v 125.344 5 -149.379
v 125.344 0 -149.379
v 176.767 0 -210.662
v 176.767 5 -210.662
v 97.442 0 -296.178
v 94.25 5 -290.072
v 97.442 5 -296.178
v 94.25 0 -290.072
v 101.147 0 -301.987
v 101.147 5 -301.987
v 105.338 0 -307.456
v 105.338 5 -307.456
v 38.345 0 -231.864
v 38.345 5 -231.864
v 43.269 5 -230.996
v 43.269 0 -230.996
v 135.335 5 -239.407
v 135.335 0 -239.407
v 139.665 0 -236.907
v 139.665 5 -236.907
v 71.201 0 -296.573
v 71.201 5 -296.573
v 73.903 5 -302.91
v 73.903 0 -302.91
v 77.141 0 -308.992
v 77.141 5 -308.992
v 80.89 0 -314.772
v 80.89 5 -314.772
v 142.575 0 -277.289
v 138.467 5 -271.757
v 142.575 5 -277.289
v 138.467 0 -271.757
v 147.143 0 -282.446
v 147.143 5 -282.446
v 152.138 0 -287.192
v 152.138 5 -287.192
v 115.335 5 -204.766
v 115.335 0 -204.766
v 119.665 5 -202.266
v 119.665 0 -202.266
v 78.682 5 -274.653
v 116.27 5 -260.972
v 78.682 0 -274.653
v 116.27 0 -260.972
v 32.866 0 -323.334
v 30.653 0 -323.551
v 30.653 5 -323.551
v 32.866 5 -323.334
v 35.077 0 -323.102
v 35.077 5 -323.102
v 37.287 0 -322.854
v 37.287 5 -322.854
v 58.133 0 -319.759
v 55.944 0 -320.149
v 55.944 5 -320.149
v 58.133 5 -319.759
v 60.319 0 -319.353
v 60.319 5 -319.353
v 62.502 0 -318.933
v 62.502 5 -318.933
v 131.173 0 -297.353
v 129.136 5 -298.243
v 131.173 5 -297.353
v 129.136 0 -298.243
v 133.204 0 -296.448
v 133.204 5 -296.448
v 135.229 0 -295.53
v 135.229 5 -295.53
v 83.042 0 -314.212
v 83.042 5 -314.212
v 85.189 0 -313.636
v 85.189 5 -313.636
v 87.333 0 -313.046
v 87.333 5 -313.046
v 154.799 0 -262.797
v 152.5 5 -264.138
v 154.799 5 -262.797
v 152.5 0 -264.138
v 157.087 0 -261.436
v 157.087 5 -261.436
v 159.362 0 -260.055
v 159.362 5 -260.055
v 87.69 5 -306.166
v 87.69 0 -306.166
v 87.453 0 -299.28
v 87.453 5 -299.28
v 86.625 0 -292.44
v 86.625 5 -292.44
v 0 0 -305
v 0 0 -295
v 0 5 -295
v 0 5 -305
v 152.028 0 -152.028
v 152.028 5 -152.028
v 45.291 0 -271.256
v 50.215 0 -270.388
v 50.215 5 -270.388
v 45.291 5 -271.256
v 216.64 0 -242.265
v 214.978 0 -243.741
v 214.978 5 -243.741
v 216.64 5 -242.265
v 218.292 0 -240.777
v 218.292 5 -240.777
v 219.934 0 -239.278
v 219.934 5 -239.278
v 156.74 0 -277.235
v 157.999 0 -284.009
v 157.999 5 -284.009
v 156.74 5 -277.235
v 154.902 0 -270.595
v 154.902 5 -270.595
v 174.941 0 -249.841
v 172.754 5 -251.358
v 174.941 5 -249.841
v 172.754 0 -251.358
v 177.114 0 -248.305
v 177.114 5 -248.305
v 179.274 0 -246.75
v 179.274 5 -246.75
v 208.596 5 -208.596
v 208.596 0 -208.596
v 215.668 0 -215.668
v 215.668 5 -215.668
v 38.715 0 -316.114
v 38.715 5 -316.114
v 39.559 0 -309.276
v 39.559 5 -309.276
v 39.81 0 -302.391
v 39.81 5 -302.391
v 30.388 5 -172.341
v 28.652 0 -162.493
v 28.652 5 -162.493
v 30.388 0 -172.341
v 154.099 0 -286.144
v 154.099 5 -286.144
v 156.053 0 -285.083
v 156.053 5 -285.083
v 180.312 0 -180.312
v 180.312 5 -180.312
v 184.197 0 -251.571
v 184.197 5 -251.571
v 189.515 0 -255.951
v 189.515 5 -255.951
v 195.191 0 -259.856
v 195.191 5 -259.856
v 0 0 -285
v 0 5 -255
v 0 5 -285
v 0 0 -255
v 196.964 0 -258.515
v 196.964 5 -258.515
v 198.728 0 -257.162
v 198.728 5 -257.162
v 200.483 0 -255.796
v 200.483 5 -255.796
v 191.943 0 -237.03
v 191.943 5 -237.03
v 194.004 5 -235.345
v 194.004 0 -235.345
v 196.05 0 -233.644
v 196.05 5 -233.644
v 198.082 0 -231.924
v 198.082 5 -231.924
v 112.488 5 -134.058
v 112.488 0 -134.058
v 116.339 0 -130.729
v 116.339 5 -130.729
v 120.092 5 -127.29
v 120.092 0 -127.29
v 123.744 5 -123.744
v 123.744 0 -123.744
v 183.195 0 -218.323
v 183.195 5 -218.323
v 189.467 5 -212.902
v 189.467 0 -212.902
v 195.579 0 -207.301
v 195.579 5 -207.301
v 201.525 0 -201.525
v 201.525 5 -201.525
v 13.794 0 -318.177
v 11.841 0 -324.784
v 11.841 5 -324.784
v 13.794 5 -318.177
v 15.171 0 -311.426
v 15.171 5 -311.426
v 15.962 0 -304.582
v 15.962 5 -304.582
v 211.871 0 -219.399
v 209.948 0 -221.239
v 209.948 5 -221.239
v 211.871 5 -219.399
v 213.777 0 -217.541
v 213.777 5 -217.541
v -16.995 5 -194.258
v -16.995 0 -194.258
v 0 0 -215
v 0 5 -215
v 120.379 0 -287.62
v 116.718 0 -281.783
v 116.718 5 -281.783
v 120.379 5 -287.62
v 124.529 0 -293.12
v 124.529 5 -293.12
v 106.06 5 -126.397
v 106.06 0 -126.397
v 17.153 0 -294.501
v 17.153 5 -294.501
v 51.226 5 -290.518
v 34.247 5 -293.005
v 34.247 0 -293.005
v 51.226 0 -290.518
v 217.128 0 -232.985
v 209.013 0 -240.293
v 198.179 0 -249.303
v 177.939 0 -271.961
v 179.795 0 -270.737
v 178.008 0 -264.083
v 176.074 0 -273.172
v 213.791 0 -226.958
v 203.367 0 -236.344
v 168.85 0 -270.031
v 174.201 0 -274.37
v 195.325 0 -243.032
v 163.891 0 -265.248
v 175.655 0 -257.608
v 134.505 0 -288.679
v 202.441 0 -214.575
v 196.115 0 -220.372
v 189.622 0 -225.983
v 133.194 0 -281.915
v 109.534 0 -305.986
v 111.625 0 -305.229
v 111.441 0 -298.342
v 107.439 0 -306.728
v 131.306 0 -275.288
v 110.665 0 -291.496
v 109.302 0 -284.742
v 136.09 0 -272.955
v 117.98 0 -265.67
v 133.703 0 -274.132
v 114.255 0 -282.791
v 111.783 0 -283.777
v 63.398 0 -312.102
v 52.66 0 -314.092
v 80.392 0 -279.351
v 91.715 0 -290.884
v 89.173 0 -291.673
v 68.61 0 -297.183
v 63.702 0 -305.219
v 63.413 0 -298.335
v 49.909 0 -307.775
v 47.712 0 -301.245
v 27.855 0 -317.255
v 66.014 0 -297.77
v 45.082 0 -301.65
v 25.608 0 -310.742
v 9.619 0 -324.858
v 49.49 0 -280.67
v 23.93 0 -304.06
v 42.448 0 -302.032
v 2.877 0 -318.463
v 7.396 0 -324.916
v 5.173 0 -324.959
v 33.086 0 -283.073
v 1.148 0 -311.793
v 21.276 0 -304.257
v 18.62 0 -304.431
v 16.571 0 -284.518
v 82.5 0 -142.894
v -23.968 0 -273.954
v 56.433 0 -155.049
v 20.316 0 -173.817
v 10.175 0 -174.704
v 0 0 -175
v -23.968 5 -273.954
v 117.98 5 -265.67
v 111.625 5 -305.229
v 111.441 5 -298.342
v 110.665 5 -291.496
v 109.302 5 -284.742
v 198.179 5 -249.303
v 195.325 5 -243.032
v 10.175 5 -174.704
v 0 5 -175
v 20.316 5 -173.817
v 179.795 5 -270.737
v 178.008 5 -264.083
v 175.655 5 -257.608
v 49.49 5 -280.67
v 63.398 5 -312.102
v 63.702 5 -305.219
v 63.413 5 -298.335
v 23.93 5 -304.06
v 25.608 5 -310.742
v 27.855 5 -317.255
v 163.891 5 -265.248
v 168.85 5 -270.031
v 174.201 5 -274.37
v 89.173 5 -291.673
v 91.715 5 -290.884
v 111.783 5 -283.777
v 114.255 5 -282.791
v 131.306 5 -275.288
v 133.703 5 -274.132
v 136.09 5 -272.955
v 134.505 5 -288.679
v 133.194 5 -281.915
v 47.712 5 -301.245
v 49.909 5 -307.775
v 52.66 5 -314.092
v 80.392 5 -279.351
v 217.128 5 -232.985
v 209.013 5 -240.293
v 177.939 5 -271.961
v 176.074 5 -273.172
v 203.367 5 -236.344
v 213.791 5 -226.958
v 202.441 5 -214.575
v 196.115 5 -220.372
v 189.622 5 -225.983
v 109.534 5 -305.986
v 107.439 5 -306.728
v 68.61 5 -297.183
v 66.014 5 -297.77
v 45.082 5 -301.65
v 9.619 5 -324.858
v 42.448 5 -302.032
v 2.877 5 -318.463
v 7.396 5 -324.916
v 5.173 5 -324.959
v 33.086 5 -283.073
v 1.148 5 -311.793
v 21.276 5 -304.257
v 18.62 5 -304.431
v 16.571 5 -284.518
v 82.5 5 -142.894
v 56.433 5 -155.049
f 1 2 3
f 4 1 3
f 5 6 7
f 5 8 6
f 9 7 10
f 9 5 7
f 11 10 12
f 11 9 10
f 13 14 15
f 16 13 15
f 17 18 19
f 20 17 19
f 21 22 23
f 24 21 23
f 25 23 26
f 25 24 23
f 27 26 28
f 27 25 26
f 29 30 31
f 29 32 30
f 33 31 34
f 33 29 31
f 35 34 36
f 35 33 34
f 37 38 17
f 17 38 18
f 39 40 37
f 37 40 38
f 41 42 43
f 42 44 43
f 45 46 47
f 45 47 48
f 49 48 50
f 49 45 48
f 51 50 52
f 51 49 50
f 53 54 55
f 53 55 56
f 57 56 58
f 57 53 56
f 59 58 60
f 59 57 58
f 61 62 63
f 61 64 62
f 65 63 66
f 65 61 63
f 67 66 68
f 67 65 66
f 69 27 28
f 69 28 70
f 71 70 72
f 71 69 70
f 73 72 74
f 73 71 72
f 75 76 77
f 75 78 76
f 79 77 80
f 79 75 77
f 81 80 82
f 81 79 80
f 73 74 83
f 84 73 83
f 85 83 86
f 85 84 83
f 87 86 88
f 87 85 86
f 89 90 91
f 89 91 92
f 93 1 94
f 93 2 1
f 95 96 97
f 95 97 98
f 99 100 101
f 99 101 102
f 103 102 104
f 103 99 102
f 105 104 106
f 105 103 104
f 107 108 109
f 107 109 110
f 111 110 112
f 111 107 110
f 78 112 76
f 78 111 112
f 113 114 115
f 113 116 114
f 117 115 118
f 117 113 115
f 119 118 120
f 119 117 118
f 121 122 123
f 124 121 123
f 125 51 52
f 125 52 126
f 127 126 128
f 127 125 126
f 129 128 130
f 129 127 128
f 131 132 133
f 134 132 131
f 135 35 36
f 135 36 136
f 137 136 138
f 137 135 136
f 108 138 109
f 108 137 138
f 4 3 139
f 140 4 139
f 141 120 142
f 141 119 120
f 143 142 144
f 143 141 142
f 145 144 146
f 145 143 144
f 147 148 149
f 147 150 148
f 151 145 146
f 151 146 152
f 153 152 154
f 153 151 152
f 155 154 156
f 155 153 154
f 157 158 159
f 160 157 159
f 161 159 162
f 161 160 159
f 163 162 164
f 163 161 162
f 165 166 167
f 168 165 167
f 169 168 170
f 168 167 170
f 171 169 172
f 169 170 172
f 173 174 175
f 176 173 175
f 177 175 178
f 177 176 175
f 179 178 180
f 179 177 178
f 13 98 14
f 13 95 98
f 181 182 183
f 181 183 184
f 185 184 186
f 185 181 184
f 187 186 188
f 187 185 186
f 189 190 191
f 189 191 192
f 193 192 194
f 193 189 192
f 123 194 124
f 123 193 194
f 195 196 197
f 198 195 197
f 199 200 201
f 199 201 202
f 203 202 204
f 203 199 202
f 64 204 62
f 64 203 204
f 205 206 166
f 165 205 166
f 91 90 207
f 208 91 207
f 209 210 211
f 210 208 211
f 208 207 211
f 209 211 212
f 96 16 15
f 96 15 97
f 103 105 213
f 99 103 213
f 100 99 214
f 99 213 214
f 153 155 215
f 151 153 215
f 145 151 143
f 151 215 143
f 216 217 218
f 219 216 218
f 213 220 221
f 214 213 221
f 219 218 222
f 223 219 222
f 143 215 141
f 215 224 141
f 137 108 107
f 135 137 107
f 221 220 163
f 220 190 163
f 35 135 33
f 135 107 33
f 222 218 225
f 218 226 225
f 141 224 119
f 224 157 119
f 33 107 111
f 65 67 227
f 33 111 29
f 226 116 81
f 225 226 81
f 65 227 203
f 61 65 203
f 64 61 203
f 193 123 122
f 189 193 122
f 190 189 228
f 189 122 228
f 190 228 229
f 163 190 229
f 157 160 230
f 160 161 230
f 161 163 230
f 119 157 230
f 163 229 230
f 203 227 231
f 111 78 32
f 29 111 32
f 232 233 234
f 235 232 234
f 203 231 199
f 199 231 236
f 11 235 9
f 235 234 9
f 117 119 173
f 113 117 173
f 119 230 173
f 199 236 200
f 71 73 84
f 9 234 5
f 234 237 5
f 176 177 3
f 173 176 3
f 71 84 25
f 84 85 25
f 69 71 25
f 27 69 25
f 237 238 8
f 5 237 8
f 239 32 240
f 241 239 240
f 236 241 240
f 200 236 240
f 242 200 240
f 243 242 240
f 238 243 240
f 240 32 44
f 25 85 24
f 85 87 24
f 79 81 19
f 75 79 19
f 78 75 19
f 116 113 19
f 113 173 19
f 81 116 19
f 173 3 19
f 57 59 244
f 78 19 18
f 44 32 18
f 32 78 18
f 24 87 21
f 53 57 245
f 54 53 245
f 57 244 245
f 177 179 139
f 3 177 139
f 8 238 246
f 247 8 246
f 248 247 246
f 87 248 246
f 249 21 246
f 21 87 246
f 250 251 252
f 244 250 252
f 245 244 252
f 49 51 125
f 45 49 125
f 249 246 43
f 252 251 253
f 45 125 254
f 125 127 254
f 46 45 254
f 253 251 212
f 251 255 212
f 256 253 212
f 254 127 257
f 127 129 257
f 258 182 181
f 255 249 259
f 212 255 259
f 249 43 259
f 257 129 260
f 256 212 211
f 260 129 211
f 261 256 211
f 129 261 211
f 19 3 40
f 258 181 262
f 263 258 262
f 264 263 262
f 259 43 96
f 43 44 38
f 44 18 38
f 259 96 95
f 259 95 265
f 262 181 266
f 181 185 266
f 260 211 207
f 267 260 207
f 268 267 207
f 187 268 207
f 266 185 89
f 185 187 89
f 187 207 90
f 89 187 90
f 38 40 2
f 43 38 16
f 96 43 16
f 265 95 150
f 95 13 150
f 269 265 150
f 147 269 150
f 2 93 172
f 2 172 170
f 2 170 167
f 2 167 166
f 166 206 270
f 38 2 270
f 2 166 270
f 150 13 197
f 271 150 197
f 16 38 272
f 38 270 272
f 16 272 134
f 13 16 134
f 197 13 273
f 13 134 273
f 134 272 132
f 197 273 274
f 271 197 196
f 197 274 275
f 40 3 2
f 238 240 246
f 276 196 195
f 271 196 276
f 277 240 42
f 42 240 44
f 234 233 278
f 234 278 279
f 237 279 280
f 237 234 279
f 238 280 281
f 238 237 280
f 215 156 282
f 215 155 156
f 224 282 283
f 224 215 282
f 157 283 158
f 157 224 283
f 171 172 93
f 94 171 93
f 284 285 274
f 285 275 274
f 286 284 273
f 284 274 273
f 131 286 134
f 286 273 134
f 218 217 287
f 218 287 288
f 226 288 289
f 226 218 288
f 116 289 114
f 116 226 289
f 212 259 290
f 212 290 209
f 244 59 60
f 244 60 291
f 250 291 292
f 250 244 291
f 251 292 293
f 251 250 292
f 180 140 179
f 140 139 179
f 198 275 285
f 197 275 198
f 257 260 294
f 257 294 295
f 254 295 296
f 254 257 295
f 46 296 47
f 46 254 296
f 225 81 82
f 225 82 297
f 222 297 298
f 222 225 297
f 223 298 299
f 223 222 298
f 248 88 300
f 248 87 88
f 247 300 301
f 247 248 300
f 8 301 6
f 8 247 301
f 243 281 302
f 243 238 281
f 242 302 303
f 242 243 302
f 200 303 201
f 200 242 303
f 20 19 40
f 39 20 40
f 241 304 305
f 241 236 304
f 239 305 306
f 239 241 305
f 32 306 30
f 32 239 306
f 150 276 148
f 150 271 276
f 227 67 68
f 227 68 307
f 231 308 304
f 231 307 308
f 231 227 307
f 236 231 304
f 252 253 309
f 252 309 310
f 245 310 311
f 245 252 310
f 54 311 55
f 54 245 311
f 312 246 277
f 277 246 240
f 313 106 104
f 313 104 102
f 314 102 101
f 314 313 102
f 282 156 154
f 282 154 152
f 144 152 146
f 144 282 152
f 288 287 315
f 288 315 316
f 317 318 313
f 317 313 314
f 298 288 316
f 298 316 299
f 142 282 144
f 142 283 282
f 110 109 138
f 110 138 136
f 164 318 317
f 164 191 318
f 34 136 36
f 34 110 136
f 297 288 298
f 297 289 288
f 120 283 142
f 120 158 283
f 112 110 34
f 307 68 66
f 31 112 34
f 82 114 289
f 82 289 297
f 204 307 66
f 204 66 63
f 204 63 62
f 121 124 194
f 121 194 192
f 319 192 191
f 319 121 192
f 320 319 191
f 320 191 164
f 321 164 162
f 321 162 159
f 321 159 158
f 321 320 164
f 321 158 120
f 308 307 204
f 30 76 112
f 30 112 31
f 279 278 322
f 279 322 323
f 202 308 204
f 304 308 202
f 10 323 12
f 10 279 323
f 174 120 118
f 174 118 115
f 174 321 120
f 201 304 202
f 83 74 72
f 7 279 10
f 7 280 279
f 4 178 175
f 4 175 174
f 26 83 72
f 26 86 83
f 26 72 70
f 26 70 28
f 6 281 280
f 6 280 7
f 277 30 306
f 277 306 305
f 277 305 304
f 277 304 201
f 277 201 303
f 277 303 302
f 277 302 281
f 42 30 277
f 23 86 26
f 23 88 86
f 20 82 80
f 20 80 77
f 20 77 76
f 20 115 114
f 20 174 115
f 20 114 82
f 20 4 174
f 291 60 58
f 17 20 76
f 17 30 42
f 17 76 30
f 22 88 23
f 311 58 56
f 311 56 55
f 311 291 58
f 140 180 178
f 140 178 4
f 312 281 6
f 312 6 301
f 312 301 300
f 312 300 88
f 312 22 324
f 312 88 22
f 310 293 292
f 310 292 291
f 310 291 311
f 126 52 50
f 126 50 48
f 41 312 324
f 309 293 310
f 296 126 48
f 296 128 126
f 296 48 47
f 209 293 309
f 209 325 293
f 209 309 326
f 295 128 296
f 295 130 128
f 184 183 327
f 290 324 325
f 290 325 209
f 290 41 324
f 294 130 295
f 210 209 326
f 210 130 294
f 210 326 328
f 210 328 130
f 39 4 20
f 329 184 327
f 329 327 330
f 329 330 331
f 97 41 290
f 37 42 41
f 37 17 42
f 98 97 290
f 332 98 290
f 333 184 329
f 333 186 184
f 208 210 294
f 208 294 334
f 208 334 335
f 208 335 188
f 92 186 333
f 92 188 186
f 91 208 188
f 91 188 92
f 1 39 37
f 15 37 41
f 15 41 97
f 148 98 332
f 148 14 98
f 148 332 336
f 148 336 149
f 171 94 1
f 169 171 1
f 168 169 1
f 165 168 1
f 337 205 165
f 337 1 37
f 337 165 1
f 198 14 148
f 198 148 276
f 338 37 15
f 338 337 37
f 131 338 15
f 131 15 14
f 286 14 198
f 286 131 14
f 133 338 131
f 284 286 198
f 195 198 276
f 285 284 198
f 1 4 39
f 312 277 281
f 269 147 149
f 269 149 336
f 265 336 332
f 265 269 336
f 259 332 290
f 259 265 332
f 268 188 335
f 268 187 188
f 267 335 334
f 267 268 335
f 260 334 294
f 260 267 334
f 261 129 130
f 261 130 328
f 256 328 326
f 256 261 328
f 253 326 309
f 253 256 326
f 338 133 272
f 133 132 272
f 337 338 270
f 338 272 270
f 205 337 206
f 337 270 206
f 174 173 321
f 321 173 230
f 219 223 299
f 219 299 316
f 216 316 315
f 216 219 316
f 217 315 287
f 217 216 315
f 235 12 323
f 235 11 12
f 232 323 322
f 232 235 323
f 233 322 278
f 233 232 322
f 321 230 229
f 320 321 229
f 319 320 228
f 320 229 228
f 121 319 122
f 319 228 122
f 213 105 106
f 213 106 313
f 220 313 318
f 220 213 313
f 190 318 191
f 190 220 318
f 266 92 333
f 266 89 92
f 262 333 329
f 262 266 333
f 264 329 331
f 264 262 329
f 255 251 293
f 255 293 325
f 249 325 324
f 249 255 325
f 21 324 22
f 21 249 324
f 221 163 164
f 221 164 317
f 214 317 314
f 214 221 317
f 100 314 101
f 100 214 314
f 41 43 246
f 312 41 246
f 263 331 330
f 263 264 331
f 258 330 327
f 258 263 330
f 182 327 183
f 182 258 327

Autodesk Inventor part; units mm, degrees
ref_plane "YZ Plane" through (0, 0, 0) normal (1, 0, 0) x (0, 1, 0)
ref_plane "XZ Plane" through (0, 0, 0) normal (0, 1, 0) x (-1, 0, 0)
ref_plane "XY Plane" through (0, 0, 0) normal (0, 0, 1) x (1, 0, 0)
sketch "Sketch2" plane through (0, 0, 0) normal (0, 1, 0) x (-1, 0, 0)
  circle A0 centre (0, 0) radius 325
  circle A1 centre (0, 0) radius 165
  line L0 (0, 0) -> (0, -325)
  line L1 (0, 0) -> (-229.8097, -229.8097)
  line L2 (0, 0) -> (28.3256, -323.7633)
  line L3 (0, 0) -> (-208.906, -248.9644)
  circle A2 centre (0, 0) radius 275 construction
  circle A3 centre (0, 0) radius 195
  circle A4 centre (0, 0) radius 215
  circle A5 centre (0, 0) radius 255 construction
  line L4 (16.9954, -194.258) -> (0, -215)
  line L5 (23.9678, -273.9535) -> (0, -255)
  line L6 (-125.3436, -149.3787) -> (-152.028, -152.028)
  line L7 (-176.7666, -210.6622) -> (-180.3122, -180.3122)
  line L8 (0, 0) -> (-111.1565, -305.4001) construction
  circle A6 centre (0, 0) radius 235 construction
  circle A7 centre (0, 0) radius 275 construction
  line L9 (0, 0) -> (-17.0092, -324.5546) construction
  line L10 (0, 0) -> (-8.5075, -324.8886) construction
  circle A8 centre (0, 0) radius 305
  arc A9 (-5.1732, -324.9588) -> (0, -305) centre (-79.3819, -295.0744) ccw
  arc A10 (-15.9625, -304.582) -> (-11.8409, -324.7842) centre (63.8301, -298.8246) ccw
  arc A11 (20.3387, -324.363) -> (23.93, -304.0598) centre (-55.9859, -300.393) ccw
  arc A12 (7.984, -304.8955) -> (13.6779, -324.712) centre (87.0788, -292.8953) ccw
  arc A13 (45.7252, -321.7673) -> (47.7125, -301.2449) centre (-32.2447, -303.8596) ccw
  arc A14 (31.8812, -303.3292) -> (39.1123, -322.6379) centre (109.7907, -285.1603) ccw
  arc A15 (70.8298, -317.1879) -> (71.2008, -296.5728) centre (-8.3048, -305.4528) ccw
  arc A16 (55.5818, -299.8927) -> (64.3057, -318.5746) centre (131.8257, -275.6672) ccw
  arc A17 (95.4978, -310.6528) -> (94.2502, -290.0722) centre (15.6864, -305.1628) ccw
  arc A18 (78.9398, -294.6074) -> (89.1025, -312.5472) centre (153.0479, -264.4745) ccw
  arc A19 (119.5769, -302.2025) -> (116.7184, -281.7833) centre (39.5808, -302.9913) ccw
  arc A20 (101.8111, -287.5057) -> (113.35, -304.5928) centre (173.3265, -251.6512) ccw
  arc A21 (142.9188, -291.889) -> (138.4671, -271.757) centre (63.2312, -298.9518) ccw
  arc A22 (124.0547, -278.6314) -> (136.8987, -294.7605) centre (192.5365, -237.2764) ccw
  arc A23 (165.3796, -279.776) -> (159.3621, -260.0553) centre (86.4918, -293.0692) ccw
  arc A24 (145.5334, -268.0392) -> (159.6033, -283.1109) centre (210.5595, -221.4387) ccw
  arc A25 (186.8208, -265.938) -> (179.2745, -246.7502) centre (109.2191, -285.3797) ccw
  arc A26 (166.1149, -255.7945) -> (181.3239, -269.7159) centre (227.2843, -204.2358) ccw
  arc A27 (207.1101, -250.4604) -> (198.0817, -231.9238) centre (131.273, -275.9308) ccw
  arc A28 (185.6722, -241.9728) -> (201.9266, -254.6579) centre (242.6078, -185.7736) ccw
  arc A29 (226.1226, -233.4386) -> (215.6676, -215.6676) centre (152.5177, -264.7806) ccw
  arc A30 (204.0848, -226.6592) -> (221.2844, -238.0299) centre (256.4356, -166.1662) ccw
  arc A31 (243.7409, -214.9776) -> (231.9238, -198.0817) centre (172.8219, -251.998) ccw
  arc A32 (221.2392, -209.9481) -> (239.2778, -219.9344) centre (268.6823, -145.5342) ccw
  arc A33 (259.8565, -195.1912) -> (246.7502, -179.2745) centre (192.0607, -237.6617) ccw
  arc A34 (237.0295, -191.9427) -> (255.7961, -200.4829) centre (279.2725, -124.005) ccw
  arc A35 (274.3699, -174.2014) -> (260.0553, -159.3621) centre (210.1154, -221.8601) ccw
  arc A36 (251.3585, -172.7539) -> (270.7372, -179.7953) centre (288.1409, -101.7113) ccw
  arc A37 (287.1918, -152.1376) -> (271.757, -138.4671) centre (226.8746, -204.6908) ccw
  arc A38 (264.1377, -152.5) -> (284.0092, -157.9993) centre (295.2329, -78.7905) ccw
  arc A39 (298.2431, -129.1358) -> (281.7833, -116.7184) centre (242.2351, -186.2594) ccw
  arc A40 (275.2885, -131.3059) -> (295.5302, -135.2291) centre (300.5046, -55.3839) ccw
  arc A41 (307.4556, -105.3378) -> (290.0722, -94.2502) centre (256.1021, -166.6797) ccw
  arc A42 (284.742, -109.3022) -> (305.2291, -111.6252) centre (303.9236, -31.6358) ccw
  arc A43 (314.7725, -80.8904) -> (296.5728, -71.2008) centre (268.3902, -146.0723) ccw
  arc A44 (292.44, -86.6247) -> (313.0462, -87.3331) centre (305.4688, -7.6927) ccw
  arc A45 (320.1488, -55.9443) -> (301.2449, -47.7125) centre (279.0235, -124.5644) ccw
  arc A46 (298.335, -63.4131) -> (318.9333, -62.5025) centre (305.1308, 16.2978) ccw
  arc A47 (323.5512, -30.6533) -> (304.0598, -23.93) centre (287.9366, -102.2884) ccw
  arc A48 (302.3907, -39.8105) -> (322.854, -37.2867) centre (302.9114, 40.1878) ccw
  arc A49 (324.9588, -5.1732) -> (305, 0) centre (295.0744, -79.3819) ccw
  arc A50 (304.582, -15.9625) -> (324.7842, -11.8409) centre (298.8246, 63.8301) ccw
  arc A51 (324.363, 20.3387) -> (304.0598, 23.93) centre (300.393, -55.9859) ccw
  arc A52 (304.8955, 7.984) -> (324.712, 13.6779) centre (292.8953, 87.0788) ccw
  arc A53 (321.7673, 45.7252) -> (301.2449, 47.7125) centre (303.8596, -32.2447) ccw
  arc A54 (303.3292, 31.8812) -> (322.6379, 39.1123) centre (285.1603, 109.7907) ccw
  arc A55 (317.1879, 70.8298) -> (296.5728, 71.2008) centre (305.4528, -8.3048) ccw
  arc A56 (299.8927, 55.5818) -> (318.5746, 64.3057) centre (275.6672, 131.8257) ccw
  arc A57 (310.6528, 95.4978) -> (290.0722, 94.2502) centre (305.1628, 15.6864) ccw
  arc A58 (294.6074, 78.9398) -> (312.5472, 89.1025) centre (264.4745, 153.0479) ccw
  arc A59 (302.2025, 119.5769) -> (281.7833, 116.7184) centre (302.9913, 39.5808) ccw
  arc A60 (287.5057, 101.8111) -> (304.5928, 113.35) centre (251.6512, 173.3265) ccw
  arc A61 (291.889, 142.9188) -> (271.757, 138.4671) centre (298.9518, 63.2312) ccw
  arc A62 (278.6314, 124.0547) -> (294.7605, 136.8987) centre (237.2764, 192.5365) ccw
  arc A63 (279.776, 165.3796) -> (260.0553, 159.3621) centre (293.0692, 86.4918) ccw
  arc A64 (268.0392, 145.5334) -> (283.1109, 159.6033) centre (221.4387, 210.5595) ccw
  arc A65 (265.938, 186.8208) -> (246.7502, 179.2745) centre (285.3797, 109.2191) ccw
  arc A66 (255.7945, 166.1149) -> (269.7159, 181.3239) centre (204.2358, 227.2843) ccw
  arc A67 (250.4604, 207.1101) -> (231.9238, 198.0817) centre (275.9308, 131.273) ccw
  arc A68 (241.9728, 185.6722) -> (254.6579, 201.9266) centre (185.7736, 242.6078) ccw
  arc A69 (233.4386, 226.1226) -> (215.6676, 215.6676) centre (264.7806, 152.5177) ccw
  arc A70 (226.6592, 204.0848) -> (238.0299, 221.2844) centre (166.1662, 256.4356) ccw
  arc A71 (214.9776, 243.7409) -> (198.0817, 231.9238) centre (251.998, 172.8219) ccw
  arc A72 (209.9481, 221.2392) -> (219.9344, 239.2778) centre (145.5342, 268.6823) ccw
  arc A73 (195.1912, 259.8565) -> (179.2745, 246.7502) centre (237.6617, 192.0607) ccw
  arc A74 (191.9427, 237.0295) -> (200.4829, 255.7961) centre (124.005, 279.2725) ccw
  arc A75 (174.2014, 274.3699) -> (159.3621, 260.0553) centre (221.8601, 210.1154) ccw
  arc A76 (172.7539, 251.3585) -> (179.7953, 270.7372) centre (101.7113, 288.1409) ccw
  arc A77 (152.1376, 287.1918) -> (138.4671, 271.757) centre (204.6908, 226.8746) ccw
  arc A78 (152.5, 264.1377) -> (157.9993, 284.0092) centre (78.7905, 295.2329) ccw
  arc A79 (129.1358, 298.2431) -> (116.7184, 281.7833) centre (186.2594, 242.2351) ccw
  arc A80 (131.3059, 275.2885) -> (135.2291, 295.5302) centre (55.3839, 300.5046) ccw
  arc A81 (105.3378, 307.4556) -> (94.2502, 290.0722) centre (166.6797, 256.1021) ccw
  arc A82 (109.3022, 284.742) -> (111.6252, 305.2291) centre (31.6358, 303.9236) ccw
  arc A83 (80.8904, 314.7725) -> (71.2008, 296.5728) centre (146.0723, 268.3902) ccw
  arc A84 (86.6247, 292.44) -> (87.3331, 313.0462) centre (7.6927, 305.4688) ccw
  arc A85 (55.9443, 320.1488) -> (47.7125, 301.2449) centre (124.5644, 279.0235) ccw
  arc A86 (63.4131, 298.335) -> (62.5025, 318.9333) centre (-16.2978, 305.1308) ccw
  arc A87 (30.6533, 323.5512) -> (23.93, 304.0598) centre (102.2884, 287.9366) ccw
  arc A88 (39.8105, 302.3907) -> (37.2867, 322.854) centre (-40.1878, 302.9114) ccw
  circle A89 centre (0, 0) radius 295
  circle A90 centre (0, 0) radius 285
  line L11 (0, 0) -> (-52.9627, -300.3664)
  line L12 (-80.392, -279.3513) -> (-117.9797, -265.6705)
  line L13 (-117.9797, -265.6705) -> (-116.2696, -260.972)
  line L14 (-116.2696, -260.972) -> (-78.6819, -274.6528)
  line L15 (-78.6819, -274.6528) -> (-80.392, -279.3513)
  line L16 (-80.392, -279.3513) -> (-116.2696, -260.972) construction
  line L17 (-117.9797, -265.6705) -> (-78.6819, -274.6528) construction
  line L18 (-98.3308, -270.1616) -> (-99.1858, -272.5109)
  circle A91 centre (0, 0) radius 175
  line L19 (-135.3349, -239.407) -> (-139.6651, -236.907)
  line L20 (-139.6651, -236.907) -> (-119.6651, -202.266)
  line L21 (-119.6651, -202.266) -> (-115.3349, -204.766)
  line L22 (-115.3349, -204.766) -> (-135.3349, -239.407)
  line L23 (-135.3349, -239.407) -> (-119.6651, -202.266) construction
  line L24 (-139.6651, -236.907) -> (-115.3349, -204.766) construction
  line L25 (-137.5, -238.157) -> (-117.5, -203.516) construction
  line L26 (-129.6651, -219.5865) -> (-125.3349, -222.0865) construction
  line L27 (-50.2153, -270.388) -> (-45.2912, -271.2563)
  line L28 (-45.2912, -271.2563) -> (-38.3453, -231.8639)
  line L29 (-38.3453, -231.8639) -> (-43.2693, -230.9957)
  line L30 (-43.2693, -230.9957) -> (-50.2153, -270.388)
  line L31 (-50.2153, -270.388) -> (-38.3453, -231.8639) construction
  line L32 (-45.2912, -271.2563) -> (-43.2693, -230.9957) construction
  line L33 (-47.7532, -270.8221) -> (-40.8073, -231.4298) construction
  arc A92 (5.1732, 324.9588) -> (0, 305) centre (79.3819, 295.0744) ccw
  arc A93 (15.9625, 304.582) -> (11.8409, 324.7842) centre (-63.8301, 298.8246) ccw
  arc A94 (-20.3387, 324.363) -> (-23.93, 304.0598) centre (55.9859, 300.393) ccw
  arc A95 (-7.984, 304.8955) -> (-13.6779, 324.712) centre (-87.0788, 292.8953) ccw
  arc A96 (-45.7252, 321.7673) -> (-47.7125, 301.2449) centre (32.2447, 303.8596) ccw
  arc A97 (-31.8812, 303.3292) -> (-39.1123, 322.6379) centre (-109.7907, 285.1603) ccw
  arc A98 (-70.8298, 317.1879) -> (-71.2008, 296.5728) centre (8.3048, 305.4528) ccw
  arc A99 (-55.5818, 299.8927) -> (-64.3057, 318.5746) centre (-131.8257, 275.6672) ccw
  arc A100 (-95.4978, 310.6528) -> (-94.2502, 290.0722) centre (-15.6864, 305.1628) ccw
  arc A101 (-78.9398, 294.6074) -> (-89.1025, 312.5472) centre (-153.0479, 264.4745) ccw
  arc A102 (-119.5769, 302.2025) -> (-116.7184, 281.7833) centre (-39.5808, 302.9913) ccw
  arc A103 (-101.8111, 287.5057) -> (-113.35, 304.5928) centre (-173.3265, 251.6512) ccw
  arc A104 (-142.9188, 291.889) -> (-138.4671, 271.757) centre (-63.2312, 298.9518) ccw
  arc A105 (-124.0547, 278.6314) -> (-136.8987, 294.7605) centre (-192.5365, 237.2764) ccw
  arc A106 (-165.3796, 279.776) -> (-159.3621, 260.0553) centre (-86.4918, 293.0692) ccw
  arc A107 (-145.5334, 268.0392) -> (-159.6033, 283.1109) centre (-210.5595, 221.4387) ccw
  arc A108 (-186.8208, 265.938) -> (-179.2745, 246.7502) centre (-109.2191, 285.3797) ccw
  arc A109 (-166.1149, 255.7945) -> (-181.3239, 269.7159) centre (-227.2843, 204.2358) ccw
  arc A110 (-207.1101, 250.4604) -> (-198.0817, 231.9238) centre (-131.273, 275.9308) ccw
  arc A111 (-185.6722, 241.9728) -> (-201.9266, 254.6579) centre (-242.6078, 185.7736) ccw
  arc A112 (-226.1226, 233.4386) -> (-215.6676, 215.6676) centre (-152.5177, 264.7806) ccw
  arc A113 (-204.0848, 226.6592) -> (-221.2844, 238.0299) centre (-256.4356, 166.1662) ccw
  arc A114 (-243.7409, 214.9776) -> (-231.9238, 198.0817) centre (-172.8219, 251.998) ccw
  arc A115 (-221.2392, 209.9481) -> (-239.2778, 219.9344) centre (-268.6823, 145.5342) ccw
  arc A116 (-259.8565, 195.1912) -> (-246.7502, 179.2745) centre (-192.0607, 237.6617) ccw
  arc A117 (-237.0295, 191.9427) -> (-255.7961, 200.4829) centre (-279.2725, 124.005) ccw
  arc A118 (-274.3699, 174.2014) -> (-260.0553, 159.3621) centre (-210.1154, 221.8601) ccw
  arc A119 (-251.3585, 172.7539) -> (-270.7372, 179.7953) centre (-288.1409, 101.7113) ccw
  arc A120 (-287.1918, 152.1376) -> (-271.757, 138.4671) centre (-226.8746, 204.6908) ccw
  arc A121 (-264.1377, 152.5) -> (-284.0092, 157.9993) centre (-295.2329, 78.7905) ccw
  arc A122 (-298.2431, 129.1358) -> (-281.7833, 116.7184) centre (-242.2351, 186.2594) ccw
  arc A123 (-275.2885, 131.3059) -> (-295.5302, 135.2291) centre (-300.5046, 55.3839) ccw
  arc A124 (-307.4556, 105.3378) -> (-290.0722, 94.2502) centre (-256.1021, 166.6797) ccw
  arc A125 (-284.742, 109.3022) -> (-305.2291, 111.6252) centre (-303.9236, 31.6358) ccw
  arc A126 (-314.7725, 80.8904) -> (-296.5728, 71.2008) centre (-268.3902, 146.0723) ccw
  arc A127 (-292.44, 86.6247) -> (-313.0462, 87.3331) centre (-305.4688, 7.6927) ccw
  arc A128 (-320.1488, 55.9443) -> (-301.2449, 47.7125) centre (-279.0235, 124.5644) ccw
  arc A129 (-298.335, 63.4131) -> (-318.9333, 62.5025) centre (-305.1308, -16.2978) ccw
  arc A130 (-323.5512, 30.6533) -> (-304.0598, 23.93) centre (-287.9366, 102.2884) ccw
  arc A131 (-302.3907, 39.8105) -> (-322.854, 37.2867) centre (-302.9114, -40.1878) ccw
  arc A132 (-324.9588, 5.1732) -> (-305, 0) centre (-295.0744, 79.3819) ccw
  arc A133 (-304.582, 15.9625) -> (-324.7842, 11.8409) centre (-298.8246, -63.8301) ccw
  arc A134 (-324.363, -20.3387) -> (-304.0598, -23.93) centre (-300.393, 55.9859) ccw
  arc A135 (-304.8955, -7.984) -> (-324.712, -13.6779) centre (-292.8953, -87.0788) ccw
  arc A136 (-321.7673, -45.7252) -> (-301.2449, -47.7125) centre (-303.8596, 32.2447) ccw
  arc A137 (-303.3292, -31.8812) -> (-322.6379, -39.1123) centre (-285.1603, -109.7907) ccw
  arc A138 (-317.1879, -70.8298) -> (-296.5728, -71.2008) centre (-305.4528, 8.3048) ccw
  arc A139 (-299.8927, -55.5818) -> (-318.5746, -64.3057) centre (-275.6672, -131.8257) ccw
  arc A140 (-310.6528, -95.4978) -> (-290.0722, -94.2502) centre (-305.1628, -15.6864) ccw
  arc A141 (-294.6074, -78.9398) -> (-312.5472, -89.1025) centre (-264.4745, -153.0479) ccw
  arc A142 (-302.2025, -119.5769) -> (-281.7833, -116.7184) centre (-302.9913, -39.5808) ccw
  arc A143 (-287.5057, -101.8111) -> (-304.5928, -113.35) centre (-251.6512, -173.3265) ccw
  arc A144 (-291.889, -142.9188) -> (-271.757, -138.4671) centre (-298.9518, -63.2312) ccw
  arc A145 (-278.6314, -124.0547) -> (-294.7605, -136.8987) centre (-237.2764, -192.5365) ccw
  arc A146 (-279.776, -165.3796) -> (-260.0553, -159.3621) centre (-293.0692, -86.4918) ccw
  arc A147 (-268.0392, -145.5334) -> (-283.1109, -159.6033) centre (-221.4387, -210.5595) ccw
  arc A148 (-265.938, -186.8208) -> (-246.7502, -179.2745) centre (-285.3797, -109.2191) ccw
  arc A149 (-255.7945, -166.1149) -> (-269.7159, -181.3239) centre (-204.2358, -227.2843) ccw
  arc A150 (-250.4604, -207.1101) -> (-231.9238, -198.0817) centre (-275.9308, -131.273) ccw
  arc A151 (-241.9728, -185.6722) -> (-254.6579, -201.9266) centre (-185.7736, -242.6078) ccw
  arc A152 (-233.4386, -226.1226) -> (-215.6676, -215.6676) centre (-264.7806, -152.5177) ccw
  arc A153 (-226.6592, -204.0848) -> (-238.0299, -221.2844) centre (-166.1662, -256.4356) ccw
  arc A154 (-214.9776, -243.7409) -> (-198.0817, -231.9238) centre (-251.998, -172.8219) ccw
  arc A155 (-209.9481, -221.2392) -> (-219.9344, -239.2778) centre (-145.5342, -268.6823) ccw
  arc A156 (-195.1912, -259.8565) -> (-179.2745, -246.7502) centre (-237.6617, -192.0607) ccw
  arc A157 (-191.9427, -237.0295) -> (-200.4829, -255.7961) centre (-124.005, -279.2725) ccw
  arc A158 (-174.2014, -274.3699) -> (-159.3621, -260.0553) centre (-221.8601, -210.1154) ccw
  arc A159 (-172.7539, -251.3585) -> (-179.7953, -270.7372) centre (-101.7113, -288.1409) ccw
  arc A160 (-152.1376, -287.1918) -> (-138.4671, -271.757) centre (-204.6908, -226.8746) ccw
  arc A161 (-152.5, -264.1377) -> (-157.9993, -284.0092) centre (-78.7905, -295.2329) ccw
  arc A162 (-129.1358, -298.2431) -> (-116.7184, -281.7833) centre (-186.2594, -242.2351) ccw
  arc A163 (-131.3059, -275.2885) -> (-135.2291, -295.5302) centre (-55.3839, -300.5046) ccw
  arc A164 (-105.3378, -307.4556) -> (-94.2502, -290.0722) centre (-166.6797, -256.1021) ccw
  arc A165 (-109.3022, -284.742) -> (-111.6252, -305.2291) centre (-31.6358, -303.9236) ccw
  arc A166 (-80.8904, -314.7725) -> (-71.2008, -296.5728) centre (-146.0723, -268.3902) ccw
  arc A167 (-86.6247, -292.44) -> (-87.3331, -313.0462) centre (-7.6927, -305.4688) ccw
  arc A168 (-55.9443, -320.1488) -> (-47.7125, -301.2449) centre (-124.5644, -279.0235) ccw
  arc A169 (-63.4131, -298.335) -> (-62.5025, -318.9333) centre (16.2978, -305.1308) ccw
  arc A170 (-30.6533, -323.5512) -> (-23.93, -304.0598) centre (-102.2884, -287.9366) ccw
  arc A171 (-39.8105, -302.3907) -> (-37.2867, -322.854) centre (40.1878, -302.9114) ccw
  point P0 (0, -165)
  point P1 (-116.6726, -116.6726)
  point P2 (-215.6676, -215.6676)
  point P3 (109.3022, 284.742)
  point P4 (111.6252, 305.2291)
  point P5 (105.3378, 307.4556)
  point P6 (94.2502, 290.0722)
  point P7 (86.6247, 292.44)
  point P8 (87.3331, 313.0462)
  point P9 (80.8904, 314.7725)
  point P10 (71.2008, 296.5728)
  point P11 (63.4131, 298.335)
  point P12 (62.5025, 318.9333)
  point P13 (55.9443, 320.1488)
  point P14 (47.7125, 301.2449)
  point P15 (39.8105, 302.3907)
  point P16 (37.2867, 322.854)
  point P17 (30.6533, 323.5512)
  point P18 (23.93, 304.0598)
  point P19 (-15.9625, -304.582)
  point P20 (-11.8409, -324.7842)
  point P21 (-37.3344, -211.7337)
  point P22 (-201.5254, -201.5254)
  point P23 (-183.1945, -218.3227)
  point P24 (-189.6223, -225.9831)
  point P25 (-208.5965, -208.5965)
  point P26 (0, -295)
  point P27 (-51.2262, -290.5183)
  point P28 (-49.4897, -280.6702)
  point P29 (0, -285)
  point P30 (0, -175)
  point P31 (-30.3884, -172.3414)
  point P32 (-28.6519, -162.4933)
  point P33 (-106.06, -126.3973)
  point P34 (-112.4878, -134.0578)
  point P35 (-123.7437, -123.7437)
  point P36 (-127.5, -220.8365)
  point P37 (15.2523, -174.3341)
  point P38 (-196.0502, -233.6436)
  point P39 (26.5825, -303.8394)
  point P40 (25.7109, -293.8774)
  point P41 (24.8394, -283.9155)
  point P42 (14.3807, -164.3721)
  point P43 (-219.9344, -239.2778)
  point P44 (-198.0817, -231.9238)
  point P45 (-200.4829, -255.7961)
  point P46 (-195.1912, -259.8565)
  point P47 (-179.2745, -246.7502)
  point P48 (-172.7539, -251.3585)
  point P49 (-179.7953, -270.7372)
  point P50 (-174.2014, -274.3699)
  point P51 (-152.5, -264.1377)
  point P52 (-157.9993, -284.0092)
  point P53 (-138.4671, -271.757)
  point P54 (-135.2291, -295.5302)
  point P55 (-116.7184, -281.7833)
  point P56 (-109.3022, -284.742)
  point P57 (-111.6252, -305.2291)
  point P58 (-105.3378, -307.4556)
  point P59 (-94.2502, -290.0722)
  point P60 (-86.6247, -292.44)
  point P61 (-87.3331, -313.0462)
  point P62 (-80.8904, -314.7725)
  point P63 (-71.2008, -296.5728)
  point P64 (-63.4131, -298.335)
  point P65 (-62.5025, -318.9333)
  point P66 (-55.9443, -320.1488)
  point P67 (-47.7125, -301.2449)
  point P68 (-37.2867, -322.854)
  point P69 (-23.93, -304.0598)
  dimension "d0" = 650
  dimension "d42" = 20
  dimension "d57" = 90
  dimension "d1" = 330
  dimension "d2" = 45
  dimension "d3" = 5
  dimension "d4" = 5
  dimension "d6" = 30
  dimension "d7" = 20
  dimension "d8" = 20
  dimension "d14" = 20
  dimension "d35" = 3
  dimension "d36" = 1.5
  dimension "d44" = 80
  dimension "d47" = 360
  dimension "d50" = 10
  dimension "d52" = 10
  dimension "d53" = 40
  dimension "d54" = 5
  dimension "d55" = 10
  dimension "d61" = 40
  dimension "d63" = 5
  dimension "d64" = 10
  dimension "d66" = 40
extrude "Extrusion1" add sketch "Sketch2" along normal blind 5 contours L0 A8 L11 A89 | A0 A10 A8 A9 | L5 L0 A4 L2 | A90 L11 L27 L28 L29 A4 L0 | L11 A8 L3 A89 | A89 L3 A90 L11 | A89 L3 A8 L1 | A4 L4 L2 | A90 L3 A4 L11 L29 L30 L27 | L1 L7 L3 A90 | A8 A168 A0 A169 | A0 A171 A8 A170 | A4 L11 A3 L0 | A8 A154 A0 A155 | A3 L11 A91 L0 | A4 L3 A3 L11 | L1 A3 L6 | A8 A156 A0 A157 | A166 A0 A167 A8 | L1 A91 L3 A3 | A3 L3 A91 L11 | A91 L3 A1 L11 | A8 A158 A0 A159 | A164 A0 A165 A8 | A8 A160 A0 A161 | A162 A0 A163 A8
properties part number "Base Plate Bottom v3" material "LCP Plastic"
